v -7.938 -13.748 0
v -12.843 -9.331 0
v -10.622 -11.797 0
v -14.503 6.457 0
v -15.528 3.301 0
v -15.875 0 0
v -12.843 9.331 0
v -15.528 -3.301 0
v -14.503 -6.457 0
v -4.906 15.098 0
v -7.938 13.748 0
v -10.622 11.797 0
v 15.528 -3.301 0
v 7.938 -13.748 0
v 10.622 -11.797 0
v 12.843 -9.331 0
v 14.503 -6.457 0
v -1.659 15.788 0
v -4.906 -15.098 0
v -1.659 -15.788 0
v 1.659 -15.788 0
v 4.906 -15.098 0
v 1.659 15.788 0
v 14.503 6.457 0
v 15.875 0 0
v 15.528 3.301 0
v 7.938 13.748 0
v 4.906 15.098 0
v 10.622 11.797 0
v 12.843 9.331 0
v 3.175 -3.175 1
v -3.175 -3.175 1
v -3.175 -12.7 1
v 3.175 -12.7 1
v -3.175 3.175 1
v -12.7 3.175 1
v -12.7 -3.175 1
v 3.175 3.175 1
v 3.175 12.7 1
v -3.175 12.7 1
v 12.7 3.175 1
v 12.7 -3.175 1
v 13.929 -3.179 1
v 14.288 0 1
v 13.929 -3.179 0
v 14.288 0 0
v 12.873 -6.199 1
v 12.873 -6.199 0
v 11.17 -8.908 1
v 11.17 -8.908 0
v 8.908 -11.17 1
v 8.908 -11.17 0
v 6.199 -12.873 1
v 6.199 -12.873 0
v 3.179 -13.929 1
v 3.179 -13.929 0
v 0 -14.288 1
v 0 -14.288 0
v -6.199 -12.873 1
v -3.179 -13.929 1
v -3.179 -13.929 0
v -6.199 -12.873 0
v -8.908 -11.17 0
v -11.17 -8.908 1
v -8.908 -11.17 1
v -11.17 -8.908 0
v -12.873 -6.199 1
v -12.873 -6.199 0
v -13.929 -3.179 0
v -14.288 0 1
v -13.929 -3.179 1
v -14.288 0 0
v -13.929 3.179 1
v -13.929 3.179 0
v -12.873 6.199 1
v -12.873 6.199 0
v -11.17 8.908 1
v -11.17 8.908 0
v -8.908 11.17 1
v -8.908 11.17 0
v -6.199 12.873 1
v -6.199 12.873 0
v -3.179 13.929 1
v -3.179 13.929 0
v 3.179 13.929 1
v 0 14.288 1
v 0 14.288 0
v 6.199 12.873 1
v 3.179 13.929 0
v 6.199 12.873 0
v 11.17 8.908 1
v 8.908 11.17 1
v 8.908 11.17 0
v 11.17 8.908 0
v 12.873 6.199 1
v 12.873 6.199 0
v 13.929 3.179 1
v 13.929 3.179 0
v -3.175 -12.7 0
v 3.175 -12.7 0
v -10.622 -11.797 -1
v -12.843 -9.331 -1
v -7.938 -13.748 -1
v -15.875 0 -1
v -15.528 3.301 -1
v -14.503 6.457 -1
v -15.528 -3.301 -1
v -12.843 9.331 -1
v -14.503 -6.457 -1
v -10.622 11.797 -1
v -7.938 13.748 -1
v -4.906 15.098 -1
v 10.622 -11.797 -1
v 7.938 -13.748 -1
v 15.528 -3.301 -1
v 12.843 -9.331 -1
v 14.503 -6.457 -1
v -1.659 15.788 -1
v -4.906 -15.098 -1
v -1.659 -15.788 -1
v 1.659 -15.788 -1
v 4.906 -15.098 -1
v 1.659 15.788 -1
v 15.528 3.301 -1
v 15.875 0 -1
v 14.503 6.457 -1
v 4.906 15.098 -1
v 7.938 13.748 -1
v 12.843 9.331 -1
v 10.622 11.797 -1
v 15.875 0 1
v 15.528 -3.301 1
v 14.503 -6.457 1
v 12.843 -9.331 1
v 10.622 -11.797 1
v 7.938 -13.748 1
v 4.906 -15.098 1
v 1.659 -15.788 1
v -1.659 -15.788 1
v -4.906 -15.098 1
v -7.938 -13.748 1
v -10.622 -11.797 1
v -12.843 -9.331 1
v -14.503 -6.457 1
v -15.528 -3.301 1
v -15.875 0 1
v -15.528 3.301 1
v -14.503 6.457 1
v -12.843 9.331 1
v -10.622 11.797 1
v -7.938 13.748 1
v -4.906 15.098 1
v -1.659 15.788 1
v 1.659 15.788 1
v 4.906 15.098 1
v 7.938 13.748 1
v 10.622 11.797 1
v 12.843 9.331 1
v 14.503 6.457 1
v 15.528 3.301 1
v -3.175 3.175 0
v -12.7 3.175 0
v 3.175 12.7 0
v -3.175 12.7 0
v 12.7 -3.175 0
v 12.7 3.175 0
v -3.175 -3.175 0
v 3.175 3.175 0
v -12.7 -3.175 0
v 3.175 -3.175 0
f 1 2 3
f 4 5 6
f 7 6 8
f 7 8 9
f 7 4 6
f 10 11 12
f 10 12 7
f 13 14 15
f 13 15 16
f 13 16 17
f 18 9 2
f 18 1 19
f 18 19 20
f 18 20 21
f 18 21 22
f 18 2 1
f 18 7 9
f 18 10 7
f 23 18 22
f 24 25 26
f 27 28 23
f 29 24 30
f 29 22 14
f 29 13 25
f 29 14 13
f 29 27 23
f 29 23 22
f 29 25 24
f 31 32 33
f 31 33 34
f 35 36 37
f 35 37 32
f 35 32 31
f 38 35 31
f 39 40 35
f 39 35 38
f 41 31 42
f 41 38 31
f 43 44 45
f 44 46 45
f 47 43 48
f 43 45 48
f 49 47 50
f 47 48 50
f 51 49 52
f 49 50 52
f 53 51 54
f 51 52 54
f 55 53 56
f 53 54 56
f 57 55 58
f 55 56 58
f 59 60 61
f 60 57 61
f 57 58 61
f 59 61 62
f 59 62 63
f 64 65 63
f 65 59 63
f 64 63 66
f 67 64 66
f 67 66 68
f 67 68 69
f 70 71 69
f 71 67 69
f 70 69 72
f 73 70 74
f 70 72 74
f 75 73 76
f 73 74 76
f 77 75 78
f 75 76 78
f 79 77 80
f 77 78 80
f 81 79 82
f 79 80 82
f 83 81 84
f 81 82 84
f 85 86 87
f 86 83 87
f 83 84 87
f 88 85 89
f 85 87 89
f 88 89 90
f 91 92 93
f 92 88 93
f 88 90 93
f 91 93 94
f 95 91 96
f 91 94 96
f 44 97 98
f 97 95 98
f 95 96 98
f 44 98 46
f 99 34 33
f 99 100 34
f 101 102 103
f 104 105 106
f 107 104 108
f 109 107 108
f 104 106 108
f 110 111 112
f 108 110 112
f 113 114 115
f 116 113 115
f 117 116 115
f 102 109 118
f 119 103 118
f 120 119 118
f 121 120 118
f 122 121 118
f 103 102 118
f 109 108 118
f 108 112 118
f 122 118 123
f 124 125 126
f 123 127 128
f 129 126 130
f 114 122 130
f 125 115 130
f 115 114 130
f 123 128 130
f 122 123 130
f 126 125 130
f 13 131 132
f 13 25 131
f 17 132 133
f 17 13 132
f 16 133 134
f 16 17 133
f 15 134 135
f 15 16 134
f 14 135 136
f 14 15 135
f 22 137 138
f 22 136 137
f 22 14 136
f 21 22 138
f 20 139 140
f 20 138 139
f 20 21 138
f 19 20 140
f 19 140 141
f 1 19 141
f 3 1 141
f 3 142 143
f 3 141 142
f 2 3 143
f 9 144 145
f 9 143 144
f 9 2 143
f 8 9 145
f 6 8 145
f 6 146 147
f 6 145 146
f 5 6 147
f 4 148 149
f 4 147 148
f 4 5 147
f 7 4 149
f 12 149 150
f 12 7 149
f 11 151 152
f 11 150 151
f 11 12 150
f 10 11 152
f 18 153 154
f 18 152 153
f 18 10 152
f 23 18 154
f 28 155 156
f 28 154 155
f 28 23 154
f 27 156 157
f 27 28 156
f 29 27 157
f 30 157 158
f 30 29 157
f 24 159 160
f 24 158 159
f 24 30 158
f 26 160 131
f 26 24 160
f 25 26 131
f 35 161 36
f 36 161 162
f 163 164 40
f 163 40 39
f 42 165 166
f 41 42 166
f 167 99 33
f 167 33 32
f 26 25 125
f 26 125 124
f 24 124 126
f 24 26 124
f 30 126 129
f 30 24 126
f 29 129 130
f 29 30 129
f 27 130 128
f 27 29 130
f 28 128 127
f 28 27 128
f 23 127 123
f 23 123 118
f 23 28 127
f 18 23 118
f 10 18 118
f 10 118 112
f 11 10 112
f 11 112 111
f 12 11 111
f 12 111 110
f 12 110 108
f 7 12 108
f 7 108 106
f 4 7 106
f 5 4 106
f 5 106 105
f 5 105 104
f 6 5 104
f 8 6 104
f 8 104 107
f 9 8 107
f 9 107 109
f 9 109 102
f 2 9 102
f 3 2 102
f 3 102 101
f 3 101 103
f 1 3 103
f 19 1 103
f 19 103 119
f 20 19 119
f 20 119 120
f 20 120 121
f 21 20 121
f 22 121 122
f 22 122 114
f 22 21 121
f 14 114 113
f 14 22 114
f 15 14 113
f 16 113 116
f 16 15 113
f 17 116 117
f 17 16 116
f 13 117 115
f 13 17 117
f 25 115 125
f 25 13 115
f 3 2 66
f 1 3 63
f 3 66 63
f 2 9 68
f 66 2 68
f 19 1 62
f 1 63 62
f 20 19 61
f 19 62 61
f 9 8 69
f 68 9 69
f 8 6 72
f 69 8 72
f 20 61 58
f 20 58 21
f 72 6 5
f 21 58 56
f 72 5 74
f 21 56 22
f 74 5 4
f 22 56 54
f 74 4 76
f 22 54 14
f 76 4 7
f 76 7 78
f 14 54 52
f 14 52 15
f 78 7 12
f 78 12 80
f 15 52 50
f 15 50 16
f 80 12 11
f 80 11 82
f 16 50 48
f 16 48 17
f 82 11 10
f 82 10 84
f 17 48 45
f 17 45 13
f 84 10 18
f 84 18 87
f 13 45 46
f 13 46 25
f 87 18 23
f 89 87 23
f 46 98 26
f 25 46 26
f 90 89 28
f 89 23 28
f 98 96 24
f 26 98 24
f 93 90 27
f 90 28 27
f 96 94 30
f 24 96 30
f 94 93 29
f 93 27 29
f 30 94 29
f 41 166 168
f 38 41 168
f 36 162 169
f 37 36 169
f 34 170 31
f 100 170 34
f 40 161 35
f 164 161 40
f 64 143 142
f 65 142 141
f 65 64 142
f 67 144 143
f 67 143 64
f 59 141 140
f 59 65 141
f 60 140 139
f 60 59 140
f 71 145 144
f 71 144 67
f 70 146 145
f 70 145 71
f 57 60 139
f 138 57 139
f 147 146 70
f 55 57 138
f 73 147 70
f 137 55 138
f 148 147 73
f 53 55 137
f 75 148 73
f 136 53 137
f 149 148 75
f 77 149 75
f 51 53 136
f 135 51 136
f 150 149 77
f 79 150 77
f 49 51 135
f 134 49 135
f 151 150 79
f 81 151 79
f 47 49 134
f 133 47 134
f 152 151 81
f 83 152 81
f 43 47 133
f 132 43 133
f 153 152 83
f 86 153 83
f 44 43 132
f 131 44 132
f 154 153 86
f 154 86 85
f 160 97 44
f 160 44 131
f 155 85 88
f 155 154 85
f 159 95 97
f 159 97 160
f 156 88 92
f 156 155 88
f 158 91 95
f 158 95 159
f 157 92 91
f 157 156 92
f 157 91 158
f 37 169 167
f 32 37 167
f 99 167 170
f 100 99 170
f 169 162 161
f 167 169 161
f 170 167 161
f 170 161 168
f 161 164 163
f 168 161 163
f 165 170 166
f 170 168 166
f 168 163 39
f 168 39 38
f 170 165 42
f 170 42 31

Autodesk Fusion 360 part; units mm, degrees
sketch "Sketch1" plane through (0, 0, 0) normal (0, 0, 1) x (1, 0, 0)
  circle A0 centre (0, 0) radius 15.875
  circle A1 centre (0, 0) radius 14.2875
  line L0 (0, 12.7) -> (3.175, 12.7)
  line L1 (3.175, 12.7) -> (3.175, 0)
  line L2 (3.175, 0) -> (0, 0)
  line L3 (0, 0) -> (0, 12.7)
  line L4 (0, 0) -> (3.175, 0)
  line L5 (3.175, 0) -> (3.175, -12.7)
  line L6 (3.175, -12.7) -> (0, -12.7)
  line L7 (0, -12.7) -> (0, 0)
  line L8 (0, -12.7) -> (-3.175, -12.7)
  line L9 (-3.175, -12.7) -> (-3.175, 12.7)
  line L10 (-3.175, 12.7) -> (0, 12.7)
  line L11 (0, 12.7) -> (0, -12.7)
  line L12 (0, 0) -> (12.7, 0)
  line L13 (12.7, 0) -> (12.7, 3.175)
  line L14 (12.7, 3.175) -> (0, 3.175)
  line L15 (0, 3.175) -> (0, 0)
  line L16 (0, 0) -> (12.7, 0)
  line L17 (12.7, 0) -> (12.7, -3.175)
  line L18 (12.7, -3.175) -> (0, -3.175)
  line L19 (0, -3.175) -> (0, 0)
  line L20 (0, 3.175) -> (-12.7, 3.175)
  line L21 (-12.7, 3.175) -> (-12.7, -3.175)
  line L22 (-12.7, -3.175) -> (0, -3.175)
  line L23 (0, -3.175) -> (0, 3.175)
  dimension "d1" = 31.75
  dimension "d2" = 28.575
  dimension "d3" = 3.175
  dimension "d4" = 12.7
  dimension "d5" = 3.175
  dimension "d6" = 12.7
  dimension "d7" = 3.175
  dimension "d8" = 3.175
  dimension "d9" = 12.7
extrude "Extrude1" add sketch "Sketch1" against normal blind 1 contours A0 | A1 | L0 L1 L3 L11 L14 | L3 L9 L10 L11 L20 | L1 L2 L3 L4 L11 L12 L14 L15 L16 L23 | L3 L7 L9 L11 L15 L19 L20 L22 L23 | L1 L12 L13 L14 L16 | L2 L4 L5 L7 L11 L12 L16 L18 L19 L23 | L9 L20 L21 L22 | L5 L12 L16 L17 L18 | L5 L6 L7 L11 L18 | L7 L8 L9 L11 L22 makes body 1 in component "Base"
extrude "Extrude1'" add sketch "Sketch1" along normal blind 1 separate body makes body 2 at (1.0583, 6.35, 0) makes body 3 at (15.2335, -1.4985, 0) in component "Top"
component "Base" placed x (1, 0, 0) y (0, 1, 0) z (0, 0, 1) at (0, 0, 0)
component "Top" placed x (1, 0, 0) y (0, 1, 0) z (0, 0, 1) at (0, 0, 0)
